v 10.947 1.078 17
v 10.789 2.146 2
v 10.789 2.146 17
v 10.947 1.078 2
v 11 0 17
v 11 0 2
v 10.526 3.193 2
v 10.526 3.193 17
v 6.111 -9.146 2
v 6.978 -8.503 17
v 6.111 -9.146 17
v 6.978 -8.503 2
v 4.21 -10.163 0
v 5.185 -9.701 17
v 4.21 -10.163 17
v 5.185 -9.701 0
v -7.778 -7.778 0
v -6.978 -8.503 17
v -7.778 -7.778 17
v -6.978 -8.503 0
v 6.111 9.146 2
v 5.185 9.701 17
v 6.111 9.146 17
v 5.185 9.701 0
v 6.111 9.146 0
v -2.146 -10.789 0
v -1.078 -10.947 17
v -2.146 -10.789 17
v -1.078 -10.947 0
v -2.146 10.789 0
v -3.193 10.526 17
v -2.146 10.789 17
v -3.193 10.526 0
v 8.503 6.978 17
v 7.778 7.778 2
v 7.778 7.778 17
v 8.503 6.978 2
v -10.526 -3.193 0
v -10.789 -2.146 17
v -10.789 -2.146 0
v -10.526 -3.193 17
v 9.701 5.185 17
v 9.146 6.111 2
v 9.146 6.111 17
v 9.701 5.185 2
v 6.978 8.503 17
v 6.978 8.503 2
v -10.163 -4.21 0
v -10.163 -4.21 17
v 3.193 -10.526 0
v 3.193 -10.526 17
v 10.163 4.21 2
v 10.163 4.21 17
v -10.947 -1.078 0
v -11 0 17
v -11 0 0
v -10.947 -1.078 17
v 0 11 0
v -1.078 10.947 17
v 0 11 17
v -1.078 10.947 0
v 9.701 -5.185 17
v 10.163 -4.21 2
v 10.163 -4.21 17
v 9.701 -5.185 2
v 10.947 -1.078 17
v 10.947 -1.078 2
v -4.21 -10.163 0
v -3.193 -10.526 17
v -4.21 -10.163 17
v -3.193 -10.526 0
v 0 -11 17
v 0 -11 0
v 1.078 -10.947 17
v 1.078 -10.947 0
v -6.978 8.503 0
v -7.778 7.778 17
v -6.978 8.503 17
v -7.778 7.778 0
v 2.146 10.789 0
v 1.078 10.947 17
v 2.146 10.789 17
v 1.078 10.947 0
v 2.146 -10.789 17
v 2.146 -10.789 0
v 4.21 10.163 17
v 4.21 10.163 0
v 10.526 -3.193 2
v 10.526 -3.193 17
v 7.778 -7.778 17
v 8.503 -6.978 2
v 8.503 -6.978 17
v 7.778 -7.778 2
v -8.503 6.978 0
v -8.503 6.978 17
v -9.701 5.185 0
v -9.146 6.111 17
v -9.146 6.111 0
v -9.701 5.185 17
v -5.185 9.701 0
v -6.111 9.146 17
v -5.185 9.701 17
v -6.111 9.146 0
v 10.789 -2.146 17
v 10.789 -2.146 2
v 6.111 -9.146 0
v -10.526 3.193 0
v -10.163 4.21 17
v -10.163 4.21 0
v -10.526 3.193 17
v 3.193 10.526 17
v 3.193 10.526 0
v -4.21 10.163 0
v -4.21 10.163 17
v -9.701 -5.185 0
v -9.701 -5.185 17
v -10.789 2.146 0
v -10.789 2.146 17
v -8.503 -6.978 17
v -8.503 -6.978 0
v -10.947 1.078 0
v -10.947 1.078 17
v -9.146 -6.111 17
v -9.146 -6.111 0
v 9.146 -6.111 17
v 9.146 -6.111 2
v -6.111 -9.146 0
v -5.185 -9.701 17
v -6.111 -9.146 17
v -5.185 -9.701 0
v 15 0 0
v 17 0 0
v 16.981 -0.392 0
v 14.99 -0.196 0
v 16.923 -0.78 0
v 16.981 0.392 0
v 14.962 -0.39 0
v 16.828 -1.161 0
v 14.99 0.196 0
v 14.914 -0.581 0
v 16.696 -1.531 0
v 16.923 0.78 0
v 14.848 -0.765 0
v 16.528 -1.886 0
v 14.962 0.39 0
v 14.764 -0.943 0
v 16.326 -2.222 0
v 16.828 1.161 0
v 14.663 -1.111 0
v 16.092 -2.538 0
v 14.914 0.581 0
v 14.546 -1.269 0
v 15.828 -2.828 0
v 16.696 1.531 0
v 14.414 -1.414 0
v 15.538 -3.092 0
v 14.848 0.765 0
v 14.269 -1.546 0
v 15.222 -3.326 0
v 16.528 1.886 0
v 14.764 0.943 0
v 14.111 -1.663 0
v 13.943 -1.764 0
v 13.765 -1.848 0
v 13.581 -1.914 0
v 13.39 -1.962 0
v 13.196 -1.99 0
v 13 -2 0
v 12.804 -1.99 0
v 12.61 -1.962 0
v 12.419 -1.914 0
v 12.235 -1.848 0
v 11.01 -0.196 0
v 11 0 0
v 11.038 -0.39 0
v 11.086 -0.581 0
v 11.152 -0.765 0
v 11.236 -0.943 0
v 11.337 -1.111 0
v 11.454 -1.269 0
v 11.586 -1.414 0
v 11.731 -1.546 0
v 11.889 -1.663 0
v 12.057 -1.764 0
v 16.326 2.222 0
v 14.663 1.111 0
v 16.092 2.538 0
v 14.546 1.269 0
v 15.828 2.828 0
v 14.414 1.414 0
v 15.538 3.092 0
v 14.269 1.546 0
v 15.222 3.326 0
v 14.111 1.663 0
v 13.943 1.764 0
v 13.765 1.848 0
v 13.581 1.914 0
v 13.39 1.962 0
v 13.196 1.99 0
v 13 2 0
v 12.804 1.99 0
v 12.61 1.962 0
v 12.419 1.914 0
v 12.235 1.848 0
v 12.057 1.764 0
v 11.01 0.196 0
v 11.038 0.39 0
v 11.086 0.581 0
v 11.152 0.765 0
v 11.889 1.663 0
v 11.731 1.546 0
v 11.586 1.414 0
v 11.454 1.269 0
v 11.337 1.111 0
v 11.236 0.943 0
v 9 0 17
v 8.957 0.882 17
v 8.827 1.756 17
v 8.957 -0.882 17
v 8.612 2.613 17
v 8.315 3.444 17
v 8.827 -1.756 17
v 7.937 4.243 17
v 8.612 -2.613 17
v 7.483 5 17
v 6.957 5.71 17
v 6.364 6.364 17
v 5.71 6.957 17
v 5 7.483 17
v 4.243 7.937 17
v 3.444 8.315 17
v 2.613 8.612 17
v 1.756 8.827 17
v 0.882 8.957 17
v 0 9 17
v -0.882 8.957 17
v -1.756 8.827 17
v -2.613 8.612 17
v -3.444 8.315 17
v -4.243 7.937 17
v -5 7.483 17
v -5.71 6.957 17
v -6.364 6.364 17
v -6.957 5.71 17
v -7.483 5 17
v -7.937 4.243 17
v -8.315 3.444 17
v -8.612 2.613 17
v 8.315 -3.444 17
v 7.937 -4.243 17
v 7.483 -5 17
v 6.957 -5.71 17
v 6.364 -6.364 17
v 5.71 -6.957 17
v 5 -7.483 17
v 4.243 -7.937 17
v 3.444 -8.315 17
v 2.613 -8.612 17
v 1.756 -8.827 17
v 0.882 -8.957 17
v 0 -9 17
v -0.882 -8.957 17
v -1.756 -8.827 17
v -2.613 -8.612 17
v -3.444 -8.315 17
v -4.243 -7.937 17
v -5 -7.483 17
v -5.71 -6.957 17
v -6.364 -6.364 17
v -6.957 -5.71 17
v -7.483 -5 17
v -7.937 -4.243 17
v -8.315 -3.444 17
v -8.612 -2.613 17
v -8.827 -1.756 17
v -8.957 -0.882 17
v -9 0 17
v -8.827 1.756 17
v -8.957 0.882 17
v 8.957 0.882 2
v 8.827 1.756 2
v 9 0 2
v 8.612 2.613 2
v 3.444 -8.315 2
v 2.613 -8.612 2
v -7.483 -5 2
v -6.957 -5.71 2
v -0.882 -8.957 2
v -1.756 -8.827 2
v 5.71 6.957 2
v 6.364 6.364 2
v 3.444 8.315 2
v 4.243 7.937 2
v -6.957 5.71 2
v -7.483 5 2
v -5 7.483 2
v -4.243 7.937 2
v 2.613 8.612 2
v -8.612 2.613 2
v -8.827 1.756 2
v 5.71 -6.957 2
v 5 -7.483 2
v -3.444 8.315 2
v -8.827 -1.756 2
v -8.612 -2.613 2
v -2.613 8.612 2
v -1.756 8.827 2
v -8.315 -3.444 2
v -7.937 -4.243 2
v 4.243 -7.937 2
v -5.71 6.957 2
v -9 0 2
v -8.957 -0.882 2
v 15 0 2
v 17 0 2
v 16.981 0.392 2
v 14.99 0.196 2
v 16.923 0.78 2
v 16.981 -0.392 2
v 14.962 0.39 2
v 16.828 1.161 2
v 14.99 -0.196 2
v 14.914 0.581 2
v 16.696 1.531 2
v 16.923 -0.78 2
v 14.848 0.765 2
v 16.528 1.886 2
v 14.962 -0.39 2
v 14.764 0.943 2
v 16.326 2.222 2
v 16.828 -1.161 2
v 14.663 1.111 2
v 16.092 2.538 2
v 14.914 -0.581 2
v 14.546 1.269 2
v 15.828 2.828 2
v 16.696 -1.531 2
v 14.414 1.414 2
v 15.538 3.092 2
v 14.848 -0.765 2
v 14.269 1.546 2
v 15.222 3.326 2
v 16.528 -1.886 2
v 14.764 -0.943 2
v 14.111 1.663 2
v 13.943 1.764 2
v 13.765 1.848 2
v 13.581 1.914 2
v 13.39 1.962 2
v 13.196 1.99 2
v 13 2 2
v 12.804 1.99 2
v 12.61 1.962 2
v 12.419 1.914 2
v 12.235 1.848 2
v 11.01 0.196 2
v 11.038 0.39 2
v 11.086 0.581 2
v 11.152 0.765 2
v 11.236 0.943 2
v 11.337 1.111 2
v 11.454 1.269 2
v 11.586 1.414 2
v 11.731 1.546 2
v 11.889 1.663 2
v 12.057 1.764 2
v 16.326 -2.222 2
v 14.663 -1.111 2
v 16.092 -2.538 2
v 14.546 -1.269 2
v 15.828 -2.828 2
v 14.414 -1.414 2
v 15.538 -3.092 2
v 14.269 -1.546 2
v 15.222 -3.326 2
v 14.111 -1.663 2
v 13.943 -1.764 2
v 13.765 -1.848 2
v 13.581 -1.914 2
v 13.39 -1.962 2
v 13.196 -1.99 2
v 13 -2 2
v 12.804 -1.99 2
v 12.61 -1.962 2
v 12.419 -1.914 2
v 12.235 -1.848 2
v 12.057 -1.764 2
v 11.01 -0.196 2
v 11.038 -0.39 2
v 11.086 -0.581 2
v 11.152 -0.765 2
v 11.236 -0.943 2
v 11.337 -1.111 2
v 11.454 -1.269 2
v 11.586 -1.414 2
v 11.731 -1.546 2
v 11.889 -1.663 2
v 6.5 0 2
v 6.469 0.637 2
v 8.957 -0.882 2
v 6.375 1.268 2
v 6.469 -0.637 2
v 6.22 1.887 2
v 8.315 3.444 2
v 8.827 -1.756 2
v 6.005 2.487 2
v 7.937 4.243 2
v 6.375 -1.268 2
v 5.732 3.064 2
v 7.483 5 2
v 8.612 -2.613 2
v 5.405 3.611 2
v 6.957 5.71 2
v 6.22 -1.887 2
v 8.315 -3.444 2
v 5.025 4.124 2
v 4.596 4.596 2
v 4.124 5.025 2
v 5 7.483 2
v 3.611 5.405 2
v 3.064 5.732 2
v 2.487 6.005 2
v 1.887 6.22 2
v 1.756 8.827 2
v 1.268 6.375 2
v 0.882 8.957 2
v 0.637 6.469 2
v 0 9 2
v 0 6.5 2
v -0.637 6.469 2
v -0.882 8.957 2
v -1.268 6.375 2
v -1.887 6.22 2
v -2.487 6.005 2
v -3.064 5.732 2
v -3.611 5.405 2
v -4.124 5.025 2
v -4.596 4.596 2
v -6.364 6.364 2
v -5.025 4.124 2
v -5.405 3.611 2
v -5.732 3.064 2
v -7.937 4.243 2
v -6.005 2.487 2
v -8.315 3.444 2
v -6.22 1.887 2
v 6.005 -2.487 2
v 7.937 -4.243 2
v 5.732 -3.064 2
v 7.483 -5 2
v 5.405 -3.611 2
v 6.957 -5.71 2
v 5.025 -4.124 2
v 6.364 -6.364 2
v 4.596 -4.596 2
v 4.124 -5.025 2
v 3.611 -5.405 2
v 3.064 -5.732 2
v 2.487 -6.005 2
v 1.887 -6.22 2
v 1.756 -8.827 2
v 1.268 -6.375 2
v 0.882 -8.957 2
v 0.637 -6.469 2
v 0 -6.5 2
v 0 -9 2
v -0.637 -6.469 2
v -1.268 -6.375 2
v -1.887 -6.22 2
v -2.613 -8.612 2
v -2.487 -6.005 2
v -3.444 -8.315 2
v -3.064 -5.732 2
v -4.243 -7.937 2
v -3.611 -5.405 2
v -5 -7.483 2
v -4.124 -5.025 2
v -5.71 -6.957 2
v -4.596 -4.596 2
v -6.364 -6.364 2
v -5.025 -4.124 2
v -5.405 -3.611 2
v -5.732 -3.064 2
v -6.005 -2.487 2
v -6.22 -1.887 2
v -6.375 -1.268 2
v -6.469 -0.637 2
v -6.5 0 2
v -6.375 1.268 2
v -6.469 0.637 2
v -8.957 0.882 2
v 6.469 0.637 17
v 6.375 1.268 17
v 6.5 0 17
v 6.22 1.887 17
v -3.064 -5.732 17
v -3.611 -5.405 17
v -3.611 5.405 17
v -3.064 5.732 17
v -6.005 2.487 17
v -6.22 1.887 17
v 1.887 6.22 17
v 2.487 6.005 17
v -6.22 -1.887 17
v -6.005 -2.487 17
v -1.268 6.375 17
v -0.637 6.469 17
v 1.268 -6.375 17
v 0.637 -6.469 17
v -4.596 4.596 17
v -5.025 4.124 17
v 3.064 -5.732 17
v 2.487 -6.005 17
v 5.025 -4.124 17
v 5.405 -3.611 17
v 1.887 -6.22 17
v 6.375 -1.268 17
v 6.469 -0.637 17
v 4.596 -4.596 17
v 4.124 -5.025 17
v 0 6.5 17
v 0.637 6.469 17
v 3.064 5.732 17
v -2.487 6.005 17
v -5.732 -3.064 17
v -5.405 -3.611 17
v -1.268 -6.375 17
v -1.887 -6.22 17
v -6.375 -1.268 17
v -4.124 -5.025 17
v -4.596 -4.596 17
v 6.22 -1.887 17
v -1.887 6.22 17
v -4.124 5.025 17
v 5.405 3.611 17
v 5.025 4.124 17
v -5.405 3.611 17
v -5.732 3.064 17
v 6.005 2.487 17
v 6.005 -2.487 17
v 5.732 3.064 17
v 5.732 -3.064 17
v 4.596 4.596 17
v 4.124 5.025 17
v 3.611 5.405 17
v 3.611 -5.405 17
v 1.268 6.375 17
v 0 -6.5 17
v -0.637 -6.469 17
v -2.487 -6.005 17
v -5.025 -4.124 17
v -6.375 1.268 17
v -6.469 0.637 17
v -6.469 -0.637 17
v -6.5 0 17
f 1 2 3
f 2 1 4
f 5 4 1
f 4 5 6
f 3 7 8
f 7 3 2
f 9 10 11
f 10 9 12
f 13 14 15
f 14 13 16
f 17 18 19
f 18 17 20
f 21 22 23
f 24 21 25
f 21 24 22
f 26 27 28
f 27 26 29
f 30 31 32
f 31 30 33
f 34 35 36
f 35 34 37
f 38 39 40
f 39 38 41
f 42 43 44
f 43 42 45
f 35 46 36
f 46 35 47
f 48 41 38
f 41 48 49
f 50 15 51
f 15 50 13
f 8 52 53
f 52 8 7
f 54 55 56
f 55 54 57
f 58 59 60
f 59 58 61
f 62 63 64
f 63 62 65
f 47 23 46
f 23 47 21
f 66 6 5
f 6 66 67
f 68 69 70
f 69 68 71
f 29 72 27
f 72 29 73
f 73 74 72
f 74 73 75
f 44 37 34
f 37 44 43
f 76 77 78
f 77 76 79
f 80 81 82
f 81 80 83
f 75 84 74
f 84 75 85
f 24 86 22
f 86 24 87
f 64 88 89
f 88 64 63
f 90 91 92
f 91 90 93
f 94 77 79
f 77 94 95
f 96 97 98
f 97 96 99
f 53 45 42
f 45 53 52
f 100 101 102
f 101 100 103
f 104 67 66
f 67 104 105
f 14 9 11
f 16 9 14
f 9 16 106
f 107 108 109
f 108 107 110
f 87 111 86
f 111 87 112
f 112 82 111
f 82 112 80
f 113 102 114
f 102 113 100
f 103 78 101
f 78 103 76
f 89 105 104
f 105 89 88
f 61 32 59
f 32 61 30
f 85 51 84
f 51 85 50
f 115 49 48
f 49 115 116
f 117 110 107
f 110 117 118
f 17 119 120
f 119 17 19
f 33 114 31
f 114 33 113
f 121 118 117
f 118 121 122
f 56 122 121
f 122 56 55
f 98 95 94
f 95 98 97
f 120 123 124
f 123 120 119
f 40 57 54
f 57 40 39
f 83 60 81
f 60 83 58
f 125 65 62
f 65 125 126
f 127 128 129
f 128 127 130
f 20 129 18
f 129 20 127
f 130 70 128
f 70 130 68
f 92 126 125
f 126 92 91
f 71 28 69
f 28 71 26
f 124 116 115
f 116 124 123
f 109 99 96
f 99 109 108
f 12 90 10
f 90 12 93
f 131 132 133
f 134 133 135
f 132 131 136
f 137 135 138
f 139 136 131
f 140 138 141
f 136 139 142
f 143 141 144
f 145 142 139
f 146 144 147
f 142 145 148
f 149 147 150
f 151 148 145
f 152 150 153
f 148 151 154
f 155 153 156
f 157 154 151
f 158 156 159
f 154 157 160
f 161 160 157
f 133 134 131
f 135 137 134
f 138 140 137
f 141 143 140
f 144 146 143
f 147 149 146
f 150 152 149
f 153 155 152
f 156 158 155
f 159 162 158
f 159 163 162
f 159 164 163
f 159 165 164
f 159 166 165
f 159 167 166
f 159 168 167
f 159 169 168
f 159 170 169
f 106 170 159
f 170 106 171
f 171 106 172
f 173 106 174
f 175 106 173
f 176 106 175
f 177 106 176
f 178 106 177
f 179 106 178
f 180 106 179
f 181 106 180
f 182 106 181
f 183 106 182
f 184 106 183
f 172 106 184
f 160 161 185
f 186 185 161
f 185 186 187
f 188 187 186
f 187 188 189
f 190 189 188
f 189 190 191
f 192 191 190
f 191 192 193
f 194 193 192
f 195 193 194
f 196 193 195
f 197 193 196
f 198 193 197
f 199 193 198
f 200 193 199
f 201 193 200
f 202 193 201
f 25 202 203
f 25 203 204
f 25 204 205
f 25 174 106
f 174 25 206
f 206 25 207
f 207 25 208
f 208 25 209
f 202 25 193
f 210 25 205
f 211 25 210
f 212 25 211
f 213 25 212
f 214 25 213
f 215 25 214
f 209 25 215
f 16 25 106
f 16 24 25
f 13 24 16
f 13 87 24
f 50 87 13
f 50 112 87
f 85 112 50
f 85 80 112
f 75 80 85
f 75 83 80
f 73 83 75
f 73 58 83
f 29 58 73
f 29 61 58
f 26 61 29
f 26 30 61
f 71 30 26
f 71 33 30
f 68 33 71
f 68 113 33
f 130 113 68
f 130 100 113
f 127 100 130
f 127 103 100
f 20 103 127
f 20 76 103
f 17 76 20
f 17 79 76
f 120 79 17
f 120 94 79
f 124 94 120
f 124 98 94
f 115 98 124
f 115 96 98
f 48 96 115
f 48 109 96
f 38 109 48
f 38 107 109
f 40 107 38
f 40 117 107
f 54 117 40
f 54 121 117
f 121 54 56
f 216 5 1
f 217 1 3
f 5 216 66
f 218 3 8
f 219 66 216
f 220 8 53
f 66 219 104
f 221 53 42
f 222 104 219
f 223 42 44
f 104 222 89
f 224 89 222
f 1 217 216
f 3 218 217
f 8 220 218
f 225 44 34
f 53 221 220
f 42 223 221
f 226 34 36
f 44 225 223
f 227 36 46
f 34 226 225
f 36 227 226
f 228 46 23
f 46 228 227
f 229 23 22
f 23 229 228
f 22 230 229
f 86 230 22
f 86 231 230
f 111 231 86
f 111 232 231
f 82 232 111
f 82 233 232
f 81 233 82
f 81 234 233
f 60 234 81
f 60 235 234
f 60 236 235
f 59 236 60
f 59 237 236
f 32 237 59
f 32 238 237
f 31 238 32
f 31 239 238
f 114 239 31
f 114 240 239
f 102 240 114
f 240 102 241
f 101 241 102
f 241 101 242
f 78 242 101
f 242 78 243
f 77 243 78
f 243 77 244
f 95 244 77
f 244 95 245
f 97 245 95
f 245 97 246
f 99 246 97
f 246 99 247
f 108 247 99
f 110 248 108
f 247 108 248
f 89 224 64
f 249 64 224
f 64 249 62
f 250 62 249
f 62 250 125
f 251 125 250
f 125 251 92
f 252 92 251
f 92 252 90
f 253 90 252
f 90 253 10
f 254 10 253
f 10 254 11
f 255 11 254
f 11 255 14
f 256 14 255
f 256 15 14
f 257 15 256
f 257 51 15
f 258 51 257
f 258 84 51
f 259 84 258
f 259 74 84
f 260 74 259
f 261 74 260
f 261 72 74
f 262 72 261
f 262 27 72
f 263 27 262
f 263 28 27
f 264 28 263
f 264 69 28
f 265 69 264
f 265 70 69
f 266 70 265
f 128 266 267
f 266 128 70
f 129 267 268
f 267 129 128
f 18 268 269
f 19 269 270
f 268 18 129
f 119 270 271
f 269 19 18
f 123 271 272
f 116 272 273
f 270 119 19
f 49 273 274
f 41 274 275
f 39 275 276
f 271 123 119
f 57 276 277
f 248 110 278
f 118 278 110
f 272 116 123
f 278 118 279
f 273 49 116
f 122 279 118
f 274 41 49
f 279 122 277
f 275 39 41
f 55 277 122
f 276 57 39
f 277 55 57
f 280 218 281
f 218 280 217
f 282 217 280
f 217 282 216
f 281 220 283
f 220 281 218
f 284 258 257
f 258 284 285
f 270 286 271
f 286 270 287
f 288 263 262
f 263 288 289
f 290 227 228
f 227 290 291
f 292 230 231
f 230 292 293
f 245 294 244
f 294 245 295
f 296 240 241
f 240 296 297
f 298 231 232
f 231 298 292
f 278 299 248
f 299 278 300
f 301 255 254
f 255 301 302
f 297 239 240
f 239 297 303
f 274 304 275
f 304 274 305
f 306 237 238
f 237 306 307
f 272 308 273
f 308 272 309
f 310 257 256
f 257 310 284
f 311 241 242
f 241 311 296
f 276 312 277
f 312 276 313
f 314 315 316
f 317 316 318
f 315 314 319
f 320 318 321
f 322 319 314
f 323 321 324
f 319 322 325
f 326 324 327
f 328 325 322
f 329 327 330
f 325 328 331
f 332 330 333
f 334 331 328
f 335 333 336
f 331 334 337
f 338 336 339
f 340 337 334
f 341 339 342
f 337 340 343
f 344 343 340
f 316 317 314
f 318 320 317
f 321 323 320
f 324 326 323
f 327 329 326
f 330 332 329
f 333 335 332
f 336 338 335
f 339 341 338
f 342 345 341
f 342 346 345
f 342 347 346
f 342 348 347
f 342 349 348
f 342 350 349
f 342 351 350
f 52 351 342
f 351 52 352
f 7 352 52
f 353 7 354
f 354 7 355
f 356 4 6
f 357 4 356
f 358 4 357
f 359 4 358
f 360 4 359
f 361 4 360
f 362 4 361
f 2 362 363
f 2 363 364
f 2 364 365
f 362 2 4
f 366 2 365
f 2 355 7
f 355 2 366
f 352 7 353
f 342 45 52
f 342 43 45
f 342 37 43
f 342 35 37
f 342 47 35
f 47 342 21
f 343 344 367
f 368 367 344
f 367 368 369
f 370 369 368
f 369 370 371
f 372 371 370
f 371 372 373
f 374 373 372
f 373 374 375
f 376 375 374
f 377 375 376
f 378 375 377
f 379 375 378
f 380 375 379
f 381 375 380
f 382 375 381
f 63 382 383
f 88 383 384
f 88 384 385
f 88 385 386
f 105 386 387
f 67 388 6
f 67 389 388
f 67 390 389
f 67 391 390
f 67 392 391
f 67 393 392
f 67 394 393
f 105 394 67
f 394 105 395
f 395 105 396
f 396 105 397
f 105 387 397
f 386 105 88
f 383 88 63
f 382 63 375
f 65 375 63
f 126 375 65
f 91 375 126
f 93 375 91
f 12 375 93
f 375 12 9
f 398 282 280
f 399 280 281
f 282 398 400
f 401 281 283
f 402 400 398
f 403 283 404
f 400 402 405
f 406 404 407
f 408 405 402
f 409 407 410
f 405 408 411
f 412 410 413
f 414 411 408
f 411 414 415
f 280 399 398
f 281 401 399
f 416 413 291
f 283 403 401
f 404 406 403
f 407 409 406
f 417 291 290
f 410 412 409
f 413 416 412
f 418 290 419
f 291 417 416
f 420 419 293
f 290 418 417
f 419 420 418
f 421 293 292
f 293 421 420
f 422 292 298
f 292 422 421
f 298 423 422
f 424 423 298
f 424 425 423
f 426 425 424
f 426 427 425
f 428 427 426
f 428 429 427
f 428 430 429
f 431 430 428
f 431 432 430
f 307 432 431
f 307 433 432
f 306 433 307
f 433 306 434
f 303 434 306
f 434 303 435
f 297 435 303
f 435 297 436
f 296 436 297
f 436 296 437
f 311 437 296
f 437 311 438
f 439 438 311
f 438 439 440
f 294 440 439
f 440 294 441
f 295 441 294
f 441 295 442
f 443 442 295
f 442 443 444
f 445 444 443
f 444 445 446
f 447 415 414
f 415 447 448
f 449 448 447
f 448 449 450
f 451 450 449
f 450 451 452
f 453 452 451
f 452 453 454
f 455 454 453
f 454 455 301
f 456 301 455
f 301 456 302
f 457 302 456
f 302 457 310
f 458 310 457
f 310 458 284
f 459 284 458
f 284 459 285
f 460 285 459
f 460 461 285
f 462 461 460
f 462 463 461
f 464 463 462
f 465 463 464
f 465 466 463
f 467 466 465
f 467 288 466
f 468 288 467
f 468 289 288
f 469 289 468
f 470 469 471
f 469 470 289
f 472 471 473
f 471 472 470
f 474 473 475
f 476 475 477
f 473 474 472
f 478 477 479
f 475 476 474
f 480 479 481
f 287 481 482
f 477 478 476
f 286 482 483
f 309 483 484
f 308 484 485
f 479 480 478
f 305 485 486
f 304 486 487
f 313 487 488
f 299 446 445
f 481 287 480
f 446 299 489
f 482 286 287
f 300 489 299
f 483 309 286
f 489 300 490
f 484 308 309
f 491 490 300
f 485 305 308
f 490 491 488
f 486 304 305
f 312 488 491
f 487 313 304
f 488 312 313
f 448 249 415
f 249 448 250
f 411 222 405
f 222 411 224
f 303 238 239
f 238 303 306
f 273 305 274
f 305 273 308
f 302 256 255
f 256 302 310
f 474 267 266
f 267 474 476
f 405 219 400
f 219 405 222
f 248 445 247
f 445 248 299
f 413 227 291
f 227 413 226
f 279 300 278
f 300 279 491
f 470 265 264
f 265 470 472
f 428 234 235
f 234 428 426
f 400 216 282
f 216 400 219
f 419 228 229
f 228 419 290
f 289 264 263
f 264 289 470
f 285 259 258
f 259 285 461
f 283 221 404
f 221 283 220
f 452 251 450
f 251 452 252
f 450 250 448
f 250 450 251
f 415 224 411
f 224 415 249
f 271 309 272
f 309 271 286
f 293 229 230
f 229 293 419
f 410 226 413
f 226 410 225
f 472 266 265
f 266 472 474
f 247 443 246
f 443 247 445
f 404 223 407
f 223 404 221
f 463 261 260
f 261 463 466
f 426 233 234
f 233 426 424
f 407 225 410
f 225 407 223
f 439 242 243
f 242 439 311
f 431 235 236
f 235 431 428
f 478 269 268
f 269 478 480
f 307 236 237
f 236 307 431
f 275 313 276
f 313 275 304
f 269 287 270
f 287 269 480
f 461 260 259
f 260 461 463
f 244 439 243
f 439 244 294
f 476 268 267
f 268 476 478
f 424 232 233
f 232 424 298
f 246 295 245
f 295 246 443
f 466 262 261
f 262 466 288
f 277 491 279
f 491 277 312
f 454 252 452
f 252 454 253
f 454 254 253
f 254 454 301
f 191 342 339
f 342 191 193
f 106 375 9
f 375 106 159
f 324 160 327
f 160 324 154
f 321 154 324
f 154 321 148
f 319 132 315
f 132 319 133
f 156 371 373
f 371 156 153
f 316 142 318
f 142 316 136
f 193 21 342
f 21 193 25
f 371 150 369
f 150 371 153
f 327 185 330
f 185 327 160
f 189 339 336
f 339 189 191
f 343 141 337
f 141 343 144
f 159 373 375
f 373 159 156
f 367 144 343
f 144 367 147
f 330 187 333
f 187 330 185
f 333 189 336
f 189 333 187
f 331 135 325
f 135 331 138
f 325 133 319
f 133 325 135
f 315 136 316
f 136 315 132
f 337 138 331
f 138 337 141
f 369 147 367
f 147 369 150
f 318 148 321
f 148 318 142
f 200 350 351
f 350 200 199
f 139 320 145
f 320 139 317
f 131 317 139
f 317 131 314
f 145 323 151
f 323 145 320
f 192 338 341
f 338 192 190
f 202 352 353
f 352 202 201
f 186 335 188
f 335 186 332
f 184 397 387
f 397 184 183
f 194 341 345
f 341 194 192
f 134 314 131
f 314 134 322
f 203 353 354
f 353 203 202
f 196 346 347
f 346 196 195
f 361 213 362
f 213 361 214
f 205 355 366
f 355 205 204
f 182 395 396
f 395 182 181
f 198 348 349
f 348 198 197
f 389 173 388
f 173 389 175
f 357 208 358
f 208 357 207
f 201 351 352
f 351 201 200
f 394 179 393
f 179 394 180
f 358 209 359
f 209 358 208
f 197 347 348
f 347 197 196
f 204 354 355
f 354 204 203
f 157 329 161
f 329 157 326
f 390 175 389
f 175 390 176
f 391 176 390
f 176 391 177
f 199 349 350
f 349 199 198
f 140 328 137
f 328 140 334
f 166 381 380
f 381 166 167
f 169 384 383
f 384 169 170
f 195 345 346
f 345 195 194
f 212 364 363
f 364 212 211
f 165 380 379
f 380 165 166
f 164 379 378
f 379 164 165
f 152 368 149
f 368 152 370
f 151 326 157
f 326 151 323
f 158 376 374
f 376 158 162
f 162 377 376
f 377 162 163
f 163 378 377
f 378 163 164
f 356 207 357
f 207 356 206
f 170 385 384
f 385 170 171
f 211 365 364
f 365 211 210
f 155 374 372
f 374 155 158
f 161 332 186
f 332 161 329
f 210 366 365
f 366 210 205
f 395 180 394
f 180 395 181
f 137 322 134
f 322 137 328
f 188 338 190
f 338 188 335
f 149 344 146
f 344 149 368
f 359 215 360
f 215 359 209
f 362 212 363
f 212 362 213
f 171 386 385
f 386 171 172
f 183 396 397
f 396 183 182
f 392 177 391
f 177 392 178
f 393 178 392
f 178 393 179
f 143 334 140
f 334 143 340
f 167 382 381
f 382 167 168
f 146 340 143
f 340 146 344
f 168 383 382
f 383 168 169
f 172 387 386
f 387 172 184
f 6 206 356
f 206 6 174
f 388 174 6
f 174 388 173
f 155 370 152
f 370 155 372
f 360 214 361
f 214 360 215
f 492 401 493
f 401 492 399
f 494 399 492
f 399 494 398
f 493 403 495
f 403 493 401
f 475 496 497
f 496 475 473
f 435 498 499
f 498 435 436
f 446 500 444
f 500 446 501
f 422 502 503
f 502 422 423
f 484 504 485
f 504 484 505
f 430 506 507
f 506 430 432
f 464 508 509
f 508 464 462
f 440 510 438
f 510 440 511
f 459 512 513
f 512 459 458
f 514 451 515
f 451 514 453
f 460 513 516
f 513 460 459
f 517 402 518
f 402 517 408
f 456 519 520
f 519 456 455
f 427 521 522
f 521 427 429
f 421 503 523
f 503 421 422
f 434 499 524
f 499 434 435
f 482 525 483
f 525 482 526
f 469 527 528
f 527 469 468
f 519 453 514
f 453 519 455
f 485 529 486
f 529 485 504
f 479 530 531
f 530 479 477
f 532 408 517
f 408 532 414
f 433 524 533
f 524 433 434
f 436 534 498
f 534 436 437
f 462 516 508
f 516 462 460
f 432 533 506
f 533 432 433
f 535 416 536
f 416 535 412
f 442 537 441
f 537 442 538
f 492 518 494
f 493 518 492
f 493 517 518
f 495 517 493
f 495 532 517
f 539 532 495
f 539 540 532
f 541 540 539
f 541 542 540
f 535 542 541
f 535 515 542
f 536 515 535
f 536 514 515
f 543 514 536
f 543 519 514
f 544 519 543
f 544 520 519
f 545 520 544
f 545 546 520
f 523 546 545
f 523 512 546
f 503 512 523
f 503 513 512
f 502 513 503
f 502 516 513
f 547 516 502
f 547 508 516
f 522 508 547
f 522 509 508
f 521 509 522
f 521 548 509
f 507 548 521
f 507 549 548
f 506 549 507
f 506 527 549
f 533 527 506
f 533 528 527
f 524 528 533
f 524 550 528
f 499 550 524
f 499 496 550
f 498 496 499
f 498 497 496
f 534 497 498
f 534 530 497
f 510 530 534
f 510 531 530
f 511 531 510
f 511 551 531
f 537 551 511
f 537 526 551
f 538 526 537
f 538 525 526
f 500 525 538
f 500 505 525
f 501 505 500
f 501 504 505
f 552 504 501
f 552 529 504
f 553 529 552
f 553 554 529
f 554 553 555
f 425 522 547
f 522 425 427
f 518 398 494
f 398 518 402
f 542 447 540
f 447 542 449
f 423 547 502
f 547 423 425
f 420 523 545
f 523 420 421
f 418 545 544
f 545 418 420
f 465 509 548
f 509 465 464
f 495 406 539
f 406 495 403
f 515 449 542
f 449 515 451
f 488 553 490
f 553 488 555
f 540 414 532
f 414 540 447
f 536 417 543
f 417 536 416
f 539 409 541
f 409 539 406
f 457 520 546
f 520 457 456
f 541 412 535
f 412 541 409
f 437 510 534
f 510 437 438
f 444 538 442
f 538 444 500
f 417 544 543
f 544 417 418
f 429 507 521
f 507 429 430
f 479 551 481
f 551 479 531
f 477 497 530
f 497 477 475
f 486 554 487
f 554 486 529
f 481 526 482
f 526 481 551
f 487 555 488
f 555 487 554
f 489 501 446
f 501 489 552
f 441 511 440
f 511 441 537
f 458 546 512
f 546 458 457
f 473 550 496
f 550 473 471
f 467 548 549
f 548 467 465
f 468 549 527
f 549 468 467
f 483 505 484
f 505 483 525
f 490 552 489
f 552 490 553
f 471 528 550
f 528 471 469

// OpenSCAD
// Outside diameter of the pipe
od=18;
// Inside diameter of the pope
id=13;
// Height of the cap
h=15;
// Wall thickness (diameter of the cap will equl to the outside diameter of the pipe plus all thicknes).
thickness=2;
// Attach hole diametew
attach_d=4;

$fn=64;

pipe_cap(od=od, id=id, h=h, thickness=thickness, attach_d=attach_d);

module pipe_cap(od, id, h, thickness, attach_d) {
  translate([0,0,(h+thickness)/2]) union() {
    difference() {
      cylinder(d=od + 2 * thickness, h=h+thickness, center=true);
      translate([0,0, thickness]) cylinder(d=od, h=h+thickness, center=true);
    }
    translate([0,0,+0.5]) cylinder(d=id, h=h+thickness-1, center=true);

    translate([0,0,-h/2]) difference() {
      hull() {
        translate([(od +  2 * thickness + attach_d)/2,0,0]) cylinder(d=attach_d+2*thickness, h=thickness, center=true);
        cylinder(d=od + 2 * thickness, h=thickness, center=true);
      }
      translate([(od +  2 * thickness + attach_d)/2,0,- 0]) cylinder(d=attach_d, h=thickness+1, center=true);
    }
  }
}
